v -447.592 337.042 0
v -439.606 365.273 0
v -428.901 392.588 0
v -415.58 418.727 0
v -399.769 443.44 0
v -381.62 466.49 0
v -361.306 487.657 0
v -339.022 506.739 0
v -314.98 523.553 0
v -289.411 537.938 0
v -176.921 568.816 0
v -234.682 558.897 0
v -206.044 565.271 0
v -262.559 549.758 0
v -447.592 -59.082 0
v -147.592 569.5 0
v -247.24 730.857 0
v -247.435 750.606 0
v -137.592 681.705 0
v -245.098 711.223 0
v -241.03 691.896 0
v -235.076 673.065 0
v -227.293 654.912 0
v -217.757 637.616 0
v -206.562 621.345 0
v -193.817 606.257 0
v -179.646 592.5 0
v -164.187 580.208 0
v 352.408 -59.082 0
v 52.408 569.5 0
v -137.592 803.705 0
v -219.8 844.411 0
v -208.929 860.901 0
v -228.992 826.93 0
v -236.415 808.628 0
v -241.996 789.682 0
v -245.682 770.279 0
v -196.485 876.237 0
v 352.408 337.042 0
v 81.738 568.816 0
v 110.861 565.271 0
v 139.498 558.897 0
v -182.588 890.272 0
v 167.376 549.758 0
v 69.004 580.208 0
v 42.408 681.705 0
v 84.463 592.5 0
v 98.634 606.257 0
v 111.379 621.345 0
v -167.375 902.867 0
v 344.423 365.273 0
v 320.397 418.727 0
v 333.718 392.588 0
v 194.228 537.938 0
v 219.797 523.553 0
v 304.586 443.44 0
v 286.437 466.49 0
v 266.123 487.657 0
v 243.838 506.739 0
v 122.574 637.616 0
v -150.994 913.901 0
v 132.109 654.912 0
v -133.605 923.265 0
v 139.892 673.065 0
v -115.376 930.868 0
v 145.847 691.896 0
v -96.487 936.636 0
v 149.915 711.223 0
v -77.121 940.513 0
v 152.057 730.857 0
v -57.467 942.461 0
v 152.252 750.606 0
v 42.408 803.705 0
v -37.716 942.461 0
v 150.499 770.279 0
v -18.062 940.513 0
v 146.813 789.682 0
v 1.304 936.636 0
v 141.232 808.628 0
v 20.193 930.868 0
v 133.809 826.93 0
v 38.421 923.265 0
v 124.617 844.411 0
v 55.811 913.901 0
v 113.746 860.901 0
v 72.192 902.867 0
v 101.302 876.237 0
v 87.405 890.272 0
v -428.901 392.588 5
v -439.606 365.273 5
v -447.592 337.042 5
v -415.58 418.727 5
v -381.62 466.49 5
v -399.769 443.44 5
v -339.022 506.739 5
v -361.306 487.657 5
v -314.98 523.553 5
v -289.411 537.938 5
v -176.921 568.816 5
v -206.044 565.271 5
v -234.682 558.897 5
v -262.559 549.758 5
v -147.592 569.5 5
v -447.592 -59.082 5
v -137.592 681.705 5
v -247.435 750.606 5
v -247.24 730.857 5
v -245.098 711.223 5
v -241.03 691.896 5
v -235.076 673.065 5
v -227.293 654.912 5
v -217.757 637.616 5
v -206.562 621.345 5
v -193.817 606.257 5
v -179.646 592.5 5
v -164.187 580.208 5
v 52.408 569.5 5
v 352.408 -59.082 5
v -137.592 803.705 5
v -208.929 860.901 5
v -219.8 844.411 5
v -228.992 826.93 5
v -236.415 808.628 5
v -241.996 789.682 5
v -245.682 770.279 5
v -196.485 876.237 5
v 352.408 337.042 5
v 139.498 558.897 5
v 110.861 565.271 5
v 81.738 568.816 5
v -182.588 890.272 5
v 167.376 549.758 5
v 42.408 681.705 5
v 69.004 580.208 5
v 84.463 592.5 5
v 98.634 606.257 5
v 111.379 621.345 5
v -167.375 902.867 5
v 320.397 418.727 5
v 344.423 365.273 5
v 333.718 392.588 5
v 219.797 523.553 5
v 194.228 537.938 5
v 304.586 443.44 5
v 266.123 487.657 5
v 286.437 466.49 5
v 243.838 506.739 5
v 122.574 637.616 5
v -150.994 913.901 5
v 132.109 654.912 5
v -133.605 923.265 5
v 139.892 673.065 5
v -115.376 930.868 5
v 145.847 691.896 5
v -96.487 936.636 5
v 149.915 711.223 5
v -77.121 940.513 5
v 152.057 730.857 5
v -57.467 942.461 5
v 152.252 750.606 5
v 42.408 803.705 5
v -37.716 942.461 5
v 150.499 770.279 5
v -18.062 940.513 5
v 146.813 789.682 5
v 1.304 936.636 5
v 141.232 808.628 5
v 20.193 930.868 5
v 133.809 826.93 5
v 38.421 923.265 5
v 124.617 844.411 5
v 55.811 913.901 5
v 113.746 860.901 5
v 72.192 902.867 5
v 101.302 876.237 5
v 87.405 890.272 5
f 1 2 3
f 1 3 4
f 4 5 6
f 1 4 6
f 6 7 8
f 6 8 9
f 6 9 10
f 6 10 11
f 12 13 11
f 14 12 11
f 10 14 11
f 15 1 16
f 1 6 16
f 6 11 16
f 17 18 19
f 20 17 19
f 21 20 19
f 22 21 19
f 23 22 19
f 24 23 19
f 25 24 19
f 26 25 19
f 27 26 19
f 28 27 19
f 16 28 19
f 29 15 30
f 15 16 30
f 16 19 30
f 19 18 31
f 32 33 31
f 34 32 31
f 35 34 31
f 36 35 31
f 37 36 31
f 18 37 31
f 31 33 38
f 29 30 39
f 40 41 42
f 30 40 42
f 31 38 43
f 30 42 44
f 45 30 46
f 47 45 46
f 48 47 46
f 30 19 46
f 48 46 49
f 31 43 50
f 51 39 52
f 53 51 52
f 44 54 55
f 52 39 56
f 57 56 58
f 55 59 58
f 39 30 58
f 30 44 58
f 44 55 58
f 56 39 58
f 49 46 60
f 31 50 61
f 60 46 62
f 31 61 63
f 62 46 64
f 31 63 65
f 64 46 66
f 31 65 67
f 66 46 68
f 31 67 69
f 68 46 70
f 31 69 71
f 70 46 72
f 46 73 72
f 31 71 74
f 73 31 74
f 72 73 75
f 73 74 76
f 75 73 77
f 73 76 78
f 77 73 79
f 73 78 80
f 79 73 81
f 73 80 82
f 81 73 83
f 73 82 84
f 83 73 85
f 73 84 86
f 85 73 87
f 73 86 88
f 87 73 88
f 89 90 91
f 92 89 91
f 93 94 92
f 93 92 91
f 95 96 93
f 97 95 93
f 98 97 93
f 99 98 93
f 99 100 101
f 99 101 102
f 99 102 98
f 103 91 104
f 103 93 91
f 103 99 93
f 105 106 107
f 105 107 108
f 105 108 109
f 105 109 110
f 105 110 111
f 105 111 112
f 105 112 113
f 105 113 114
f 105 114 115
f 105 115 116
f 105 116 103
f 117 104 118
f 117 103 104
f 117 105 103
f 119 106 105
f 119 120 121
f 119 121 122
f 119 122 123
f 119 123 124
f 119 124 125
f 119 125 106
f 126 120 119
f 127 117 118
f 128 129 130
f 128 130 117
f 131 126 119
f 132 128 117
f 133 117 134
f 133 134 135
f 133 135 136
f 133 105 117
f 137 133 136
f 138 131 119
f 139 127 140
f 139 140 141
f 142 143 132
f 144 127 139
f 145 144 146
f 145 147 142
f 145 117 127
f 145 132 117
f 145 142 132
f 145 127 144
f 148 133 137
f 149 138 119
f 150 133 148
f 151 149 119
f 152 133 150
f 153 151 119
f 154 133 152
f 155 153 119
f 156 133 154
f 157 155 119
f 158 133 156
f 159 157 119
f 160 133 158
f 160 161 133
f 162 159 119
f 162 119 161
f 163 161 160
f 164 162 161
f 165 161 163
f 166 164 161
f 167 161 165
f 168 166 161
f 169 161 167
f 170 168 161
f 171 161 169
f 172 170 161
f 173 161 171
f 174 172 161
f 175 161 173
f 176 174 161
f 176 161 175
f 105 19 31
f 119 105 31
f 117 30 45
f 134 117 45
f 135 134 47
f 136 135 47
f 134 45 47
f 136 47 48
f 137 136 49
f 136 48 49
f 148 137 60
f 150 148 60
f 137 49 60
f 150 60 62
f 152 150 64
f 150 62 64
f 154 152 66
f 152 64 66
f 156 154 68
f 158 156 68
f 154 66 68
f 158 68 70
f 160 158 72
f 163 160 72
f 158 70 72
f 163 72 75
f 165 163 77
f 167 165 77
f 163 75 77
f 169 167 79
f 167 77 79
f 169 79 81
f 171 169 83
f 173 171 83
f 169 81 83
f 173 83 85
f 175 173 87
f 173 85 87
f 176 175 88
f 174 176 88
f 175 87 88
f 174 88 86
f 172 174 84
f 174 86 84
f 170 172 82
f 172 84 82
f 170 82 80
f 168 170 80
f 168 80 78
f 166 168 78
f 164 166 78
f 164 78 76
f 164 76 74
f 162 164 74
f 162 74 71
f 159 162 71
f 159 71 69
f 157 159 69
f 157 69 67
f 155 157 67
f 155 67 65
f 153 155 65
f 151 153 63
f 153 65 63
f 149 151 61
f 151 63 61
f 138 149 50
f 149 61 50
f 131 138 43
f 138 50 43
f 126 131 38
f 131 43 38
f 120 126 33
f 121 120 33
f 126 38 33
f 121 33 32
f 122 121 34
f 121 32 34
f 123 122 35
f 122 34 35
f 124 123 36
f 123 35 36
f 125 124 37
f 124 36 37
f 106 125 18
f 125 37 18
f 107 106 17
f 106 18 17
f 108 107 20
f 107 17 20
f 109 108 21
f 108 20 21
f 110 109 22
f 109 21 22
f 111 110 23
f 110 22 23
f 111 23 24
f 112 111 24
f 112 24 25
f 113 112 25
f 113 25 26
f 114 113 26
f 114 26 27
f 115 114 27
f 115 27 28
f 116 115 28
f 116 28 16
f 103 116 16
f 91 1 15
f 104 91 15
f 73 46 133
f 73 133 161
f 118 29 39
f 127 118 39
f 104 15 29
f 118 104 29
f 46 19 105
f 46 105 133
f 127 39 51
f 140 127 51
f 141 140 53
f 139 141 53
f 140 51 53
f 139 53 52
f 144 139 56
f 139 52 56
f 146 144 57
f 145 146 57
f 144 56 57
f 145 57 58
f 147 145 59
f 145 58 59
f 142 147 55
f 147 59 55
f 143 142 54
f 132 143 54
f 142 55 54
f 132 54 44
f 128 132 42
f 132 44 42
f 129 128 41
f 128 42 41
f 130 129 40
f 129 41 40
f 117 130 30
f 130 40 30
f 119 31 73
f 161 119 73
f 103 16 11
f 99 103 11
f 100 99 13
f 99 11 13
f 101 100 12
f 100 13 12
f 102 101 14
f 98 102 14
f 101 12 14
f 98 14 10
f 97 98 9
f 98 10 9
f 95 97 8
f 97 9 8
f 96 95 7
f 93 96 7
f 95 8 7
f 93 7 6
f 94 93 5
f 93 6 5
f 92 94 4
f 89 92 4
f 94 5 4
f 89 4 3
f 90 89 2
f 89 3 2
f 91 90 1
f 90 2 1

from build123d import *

# Parameters (mm, degrees)
SKETCH1_W           = 180
SKETCH1_H           = 122
BOSS_EXTRUDE1_DEPTH = 5


with BuildPart() as part:
    # Sketch1 → Boss-Extrude1 (new body)
    with BuildSketch(Plane.XY):
        with BuildLine():
            Line((-447.591580819, 337.042460879), (-447.591580819, -59.082484796))
            Line((-447.591580819, -59.082484796), (352.408419181, -59.082484796))
            Line((352.408419181, -59.082484796), (352.408419181, 337.042460879))
            ThreePointArc((352.408419181, 337.042460879), (243.83842934, 506.739072759), (52.408419181, 569.5))
            ThreePointArc((52.408419181, 569.5), (-47.591580819, 942.705080757), (-147.591580819, 569.5))
            ThreePointArc((-147.591580819, 569.5), (-339.021590977, 506.739072759), (-447.591580819, 337.042460879))
        make_face()
        with Locations((-47.591580819, 742.705080757)):
            Rectangle(SKETCH1_W, SKETCH1_H, mode=Mode.SUBTRACT)
    extrude(amount=BOSS_EXTRUDE1_DEPTH)


solid = part.part
